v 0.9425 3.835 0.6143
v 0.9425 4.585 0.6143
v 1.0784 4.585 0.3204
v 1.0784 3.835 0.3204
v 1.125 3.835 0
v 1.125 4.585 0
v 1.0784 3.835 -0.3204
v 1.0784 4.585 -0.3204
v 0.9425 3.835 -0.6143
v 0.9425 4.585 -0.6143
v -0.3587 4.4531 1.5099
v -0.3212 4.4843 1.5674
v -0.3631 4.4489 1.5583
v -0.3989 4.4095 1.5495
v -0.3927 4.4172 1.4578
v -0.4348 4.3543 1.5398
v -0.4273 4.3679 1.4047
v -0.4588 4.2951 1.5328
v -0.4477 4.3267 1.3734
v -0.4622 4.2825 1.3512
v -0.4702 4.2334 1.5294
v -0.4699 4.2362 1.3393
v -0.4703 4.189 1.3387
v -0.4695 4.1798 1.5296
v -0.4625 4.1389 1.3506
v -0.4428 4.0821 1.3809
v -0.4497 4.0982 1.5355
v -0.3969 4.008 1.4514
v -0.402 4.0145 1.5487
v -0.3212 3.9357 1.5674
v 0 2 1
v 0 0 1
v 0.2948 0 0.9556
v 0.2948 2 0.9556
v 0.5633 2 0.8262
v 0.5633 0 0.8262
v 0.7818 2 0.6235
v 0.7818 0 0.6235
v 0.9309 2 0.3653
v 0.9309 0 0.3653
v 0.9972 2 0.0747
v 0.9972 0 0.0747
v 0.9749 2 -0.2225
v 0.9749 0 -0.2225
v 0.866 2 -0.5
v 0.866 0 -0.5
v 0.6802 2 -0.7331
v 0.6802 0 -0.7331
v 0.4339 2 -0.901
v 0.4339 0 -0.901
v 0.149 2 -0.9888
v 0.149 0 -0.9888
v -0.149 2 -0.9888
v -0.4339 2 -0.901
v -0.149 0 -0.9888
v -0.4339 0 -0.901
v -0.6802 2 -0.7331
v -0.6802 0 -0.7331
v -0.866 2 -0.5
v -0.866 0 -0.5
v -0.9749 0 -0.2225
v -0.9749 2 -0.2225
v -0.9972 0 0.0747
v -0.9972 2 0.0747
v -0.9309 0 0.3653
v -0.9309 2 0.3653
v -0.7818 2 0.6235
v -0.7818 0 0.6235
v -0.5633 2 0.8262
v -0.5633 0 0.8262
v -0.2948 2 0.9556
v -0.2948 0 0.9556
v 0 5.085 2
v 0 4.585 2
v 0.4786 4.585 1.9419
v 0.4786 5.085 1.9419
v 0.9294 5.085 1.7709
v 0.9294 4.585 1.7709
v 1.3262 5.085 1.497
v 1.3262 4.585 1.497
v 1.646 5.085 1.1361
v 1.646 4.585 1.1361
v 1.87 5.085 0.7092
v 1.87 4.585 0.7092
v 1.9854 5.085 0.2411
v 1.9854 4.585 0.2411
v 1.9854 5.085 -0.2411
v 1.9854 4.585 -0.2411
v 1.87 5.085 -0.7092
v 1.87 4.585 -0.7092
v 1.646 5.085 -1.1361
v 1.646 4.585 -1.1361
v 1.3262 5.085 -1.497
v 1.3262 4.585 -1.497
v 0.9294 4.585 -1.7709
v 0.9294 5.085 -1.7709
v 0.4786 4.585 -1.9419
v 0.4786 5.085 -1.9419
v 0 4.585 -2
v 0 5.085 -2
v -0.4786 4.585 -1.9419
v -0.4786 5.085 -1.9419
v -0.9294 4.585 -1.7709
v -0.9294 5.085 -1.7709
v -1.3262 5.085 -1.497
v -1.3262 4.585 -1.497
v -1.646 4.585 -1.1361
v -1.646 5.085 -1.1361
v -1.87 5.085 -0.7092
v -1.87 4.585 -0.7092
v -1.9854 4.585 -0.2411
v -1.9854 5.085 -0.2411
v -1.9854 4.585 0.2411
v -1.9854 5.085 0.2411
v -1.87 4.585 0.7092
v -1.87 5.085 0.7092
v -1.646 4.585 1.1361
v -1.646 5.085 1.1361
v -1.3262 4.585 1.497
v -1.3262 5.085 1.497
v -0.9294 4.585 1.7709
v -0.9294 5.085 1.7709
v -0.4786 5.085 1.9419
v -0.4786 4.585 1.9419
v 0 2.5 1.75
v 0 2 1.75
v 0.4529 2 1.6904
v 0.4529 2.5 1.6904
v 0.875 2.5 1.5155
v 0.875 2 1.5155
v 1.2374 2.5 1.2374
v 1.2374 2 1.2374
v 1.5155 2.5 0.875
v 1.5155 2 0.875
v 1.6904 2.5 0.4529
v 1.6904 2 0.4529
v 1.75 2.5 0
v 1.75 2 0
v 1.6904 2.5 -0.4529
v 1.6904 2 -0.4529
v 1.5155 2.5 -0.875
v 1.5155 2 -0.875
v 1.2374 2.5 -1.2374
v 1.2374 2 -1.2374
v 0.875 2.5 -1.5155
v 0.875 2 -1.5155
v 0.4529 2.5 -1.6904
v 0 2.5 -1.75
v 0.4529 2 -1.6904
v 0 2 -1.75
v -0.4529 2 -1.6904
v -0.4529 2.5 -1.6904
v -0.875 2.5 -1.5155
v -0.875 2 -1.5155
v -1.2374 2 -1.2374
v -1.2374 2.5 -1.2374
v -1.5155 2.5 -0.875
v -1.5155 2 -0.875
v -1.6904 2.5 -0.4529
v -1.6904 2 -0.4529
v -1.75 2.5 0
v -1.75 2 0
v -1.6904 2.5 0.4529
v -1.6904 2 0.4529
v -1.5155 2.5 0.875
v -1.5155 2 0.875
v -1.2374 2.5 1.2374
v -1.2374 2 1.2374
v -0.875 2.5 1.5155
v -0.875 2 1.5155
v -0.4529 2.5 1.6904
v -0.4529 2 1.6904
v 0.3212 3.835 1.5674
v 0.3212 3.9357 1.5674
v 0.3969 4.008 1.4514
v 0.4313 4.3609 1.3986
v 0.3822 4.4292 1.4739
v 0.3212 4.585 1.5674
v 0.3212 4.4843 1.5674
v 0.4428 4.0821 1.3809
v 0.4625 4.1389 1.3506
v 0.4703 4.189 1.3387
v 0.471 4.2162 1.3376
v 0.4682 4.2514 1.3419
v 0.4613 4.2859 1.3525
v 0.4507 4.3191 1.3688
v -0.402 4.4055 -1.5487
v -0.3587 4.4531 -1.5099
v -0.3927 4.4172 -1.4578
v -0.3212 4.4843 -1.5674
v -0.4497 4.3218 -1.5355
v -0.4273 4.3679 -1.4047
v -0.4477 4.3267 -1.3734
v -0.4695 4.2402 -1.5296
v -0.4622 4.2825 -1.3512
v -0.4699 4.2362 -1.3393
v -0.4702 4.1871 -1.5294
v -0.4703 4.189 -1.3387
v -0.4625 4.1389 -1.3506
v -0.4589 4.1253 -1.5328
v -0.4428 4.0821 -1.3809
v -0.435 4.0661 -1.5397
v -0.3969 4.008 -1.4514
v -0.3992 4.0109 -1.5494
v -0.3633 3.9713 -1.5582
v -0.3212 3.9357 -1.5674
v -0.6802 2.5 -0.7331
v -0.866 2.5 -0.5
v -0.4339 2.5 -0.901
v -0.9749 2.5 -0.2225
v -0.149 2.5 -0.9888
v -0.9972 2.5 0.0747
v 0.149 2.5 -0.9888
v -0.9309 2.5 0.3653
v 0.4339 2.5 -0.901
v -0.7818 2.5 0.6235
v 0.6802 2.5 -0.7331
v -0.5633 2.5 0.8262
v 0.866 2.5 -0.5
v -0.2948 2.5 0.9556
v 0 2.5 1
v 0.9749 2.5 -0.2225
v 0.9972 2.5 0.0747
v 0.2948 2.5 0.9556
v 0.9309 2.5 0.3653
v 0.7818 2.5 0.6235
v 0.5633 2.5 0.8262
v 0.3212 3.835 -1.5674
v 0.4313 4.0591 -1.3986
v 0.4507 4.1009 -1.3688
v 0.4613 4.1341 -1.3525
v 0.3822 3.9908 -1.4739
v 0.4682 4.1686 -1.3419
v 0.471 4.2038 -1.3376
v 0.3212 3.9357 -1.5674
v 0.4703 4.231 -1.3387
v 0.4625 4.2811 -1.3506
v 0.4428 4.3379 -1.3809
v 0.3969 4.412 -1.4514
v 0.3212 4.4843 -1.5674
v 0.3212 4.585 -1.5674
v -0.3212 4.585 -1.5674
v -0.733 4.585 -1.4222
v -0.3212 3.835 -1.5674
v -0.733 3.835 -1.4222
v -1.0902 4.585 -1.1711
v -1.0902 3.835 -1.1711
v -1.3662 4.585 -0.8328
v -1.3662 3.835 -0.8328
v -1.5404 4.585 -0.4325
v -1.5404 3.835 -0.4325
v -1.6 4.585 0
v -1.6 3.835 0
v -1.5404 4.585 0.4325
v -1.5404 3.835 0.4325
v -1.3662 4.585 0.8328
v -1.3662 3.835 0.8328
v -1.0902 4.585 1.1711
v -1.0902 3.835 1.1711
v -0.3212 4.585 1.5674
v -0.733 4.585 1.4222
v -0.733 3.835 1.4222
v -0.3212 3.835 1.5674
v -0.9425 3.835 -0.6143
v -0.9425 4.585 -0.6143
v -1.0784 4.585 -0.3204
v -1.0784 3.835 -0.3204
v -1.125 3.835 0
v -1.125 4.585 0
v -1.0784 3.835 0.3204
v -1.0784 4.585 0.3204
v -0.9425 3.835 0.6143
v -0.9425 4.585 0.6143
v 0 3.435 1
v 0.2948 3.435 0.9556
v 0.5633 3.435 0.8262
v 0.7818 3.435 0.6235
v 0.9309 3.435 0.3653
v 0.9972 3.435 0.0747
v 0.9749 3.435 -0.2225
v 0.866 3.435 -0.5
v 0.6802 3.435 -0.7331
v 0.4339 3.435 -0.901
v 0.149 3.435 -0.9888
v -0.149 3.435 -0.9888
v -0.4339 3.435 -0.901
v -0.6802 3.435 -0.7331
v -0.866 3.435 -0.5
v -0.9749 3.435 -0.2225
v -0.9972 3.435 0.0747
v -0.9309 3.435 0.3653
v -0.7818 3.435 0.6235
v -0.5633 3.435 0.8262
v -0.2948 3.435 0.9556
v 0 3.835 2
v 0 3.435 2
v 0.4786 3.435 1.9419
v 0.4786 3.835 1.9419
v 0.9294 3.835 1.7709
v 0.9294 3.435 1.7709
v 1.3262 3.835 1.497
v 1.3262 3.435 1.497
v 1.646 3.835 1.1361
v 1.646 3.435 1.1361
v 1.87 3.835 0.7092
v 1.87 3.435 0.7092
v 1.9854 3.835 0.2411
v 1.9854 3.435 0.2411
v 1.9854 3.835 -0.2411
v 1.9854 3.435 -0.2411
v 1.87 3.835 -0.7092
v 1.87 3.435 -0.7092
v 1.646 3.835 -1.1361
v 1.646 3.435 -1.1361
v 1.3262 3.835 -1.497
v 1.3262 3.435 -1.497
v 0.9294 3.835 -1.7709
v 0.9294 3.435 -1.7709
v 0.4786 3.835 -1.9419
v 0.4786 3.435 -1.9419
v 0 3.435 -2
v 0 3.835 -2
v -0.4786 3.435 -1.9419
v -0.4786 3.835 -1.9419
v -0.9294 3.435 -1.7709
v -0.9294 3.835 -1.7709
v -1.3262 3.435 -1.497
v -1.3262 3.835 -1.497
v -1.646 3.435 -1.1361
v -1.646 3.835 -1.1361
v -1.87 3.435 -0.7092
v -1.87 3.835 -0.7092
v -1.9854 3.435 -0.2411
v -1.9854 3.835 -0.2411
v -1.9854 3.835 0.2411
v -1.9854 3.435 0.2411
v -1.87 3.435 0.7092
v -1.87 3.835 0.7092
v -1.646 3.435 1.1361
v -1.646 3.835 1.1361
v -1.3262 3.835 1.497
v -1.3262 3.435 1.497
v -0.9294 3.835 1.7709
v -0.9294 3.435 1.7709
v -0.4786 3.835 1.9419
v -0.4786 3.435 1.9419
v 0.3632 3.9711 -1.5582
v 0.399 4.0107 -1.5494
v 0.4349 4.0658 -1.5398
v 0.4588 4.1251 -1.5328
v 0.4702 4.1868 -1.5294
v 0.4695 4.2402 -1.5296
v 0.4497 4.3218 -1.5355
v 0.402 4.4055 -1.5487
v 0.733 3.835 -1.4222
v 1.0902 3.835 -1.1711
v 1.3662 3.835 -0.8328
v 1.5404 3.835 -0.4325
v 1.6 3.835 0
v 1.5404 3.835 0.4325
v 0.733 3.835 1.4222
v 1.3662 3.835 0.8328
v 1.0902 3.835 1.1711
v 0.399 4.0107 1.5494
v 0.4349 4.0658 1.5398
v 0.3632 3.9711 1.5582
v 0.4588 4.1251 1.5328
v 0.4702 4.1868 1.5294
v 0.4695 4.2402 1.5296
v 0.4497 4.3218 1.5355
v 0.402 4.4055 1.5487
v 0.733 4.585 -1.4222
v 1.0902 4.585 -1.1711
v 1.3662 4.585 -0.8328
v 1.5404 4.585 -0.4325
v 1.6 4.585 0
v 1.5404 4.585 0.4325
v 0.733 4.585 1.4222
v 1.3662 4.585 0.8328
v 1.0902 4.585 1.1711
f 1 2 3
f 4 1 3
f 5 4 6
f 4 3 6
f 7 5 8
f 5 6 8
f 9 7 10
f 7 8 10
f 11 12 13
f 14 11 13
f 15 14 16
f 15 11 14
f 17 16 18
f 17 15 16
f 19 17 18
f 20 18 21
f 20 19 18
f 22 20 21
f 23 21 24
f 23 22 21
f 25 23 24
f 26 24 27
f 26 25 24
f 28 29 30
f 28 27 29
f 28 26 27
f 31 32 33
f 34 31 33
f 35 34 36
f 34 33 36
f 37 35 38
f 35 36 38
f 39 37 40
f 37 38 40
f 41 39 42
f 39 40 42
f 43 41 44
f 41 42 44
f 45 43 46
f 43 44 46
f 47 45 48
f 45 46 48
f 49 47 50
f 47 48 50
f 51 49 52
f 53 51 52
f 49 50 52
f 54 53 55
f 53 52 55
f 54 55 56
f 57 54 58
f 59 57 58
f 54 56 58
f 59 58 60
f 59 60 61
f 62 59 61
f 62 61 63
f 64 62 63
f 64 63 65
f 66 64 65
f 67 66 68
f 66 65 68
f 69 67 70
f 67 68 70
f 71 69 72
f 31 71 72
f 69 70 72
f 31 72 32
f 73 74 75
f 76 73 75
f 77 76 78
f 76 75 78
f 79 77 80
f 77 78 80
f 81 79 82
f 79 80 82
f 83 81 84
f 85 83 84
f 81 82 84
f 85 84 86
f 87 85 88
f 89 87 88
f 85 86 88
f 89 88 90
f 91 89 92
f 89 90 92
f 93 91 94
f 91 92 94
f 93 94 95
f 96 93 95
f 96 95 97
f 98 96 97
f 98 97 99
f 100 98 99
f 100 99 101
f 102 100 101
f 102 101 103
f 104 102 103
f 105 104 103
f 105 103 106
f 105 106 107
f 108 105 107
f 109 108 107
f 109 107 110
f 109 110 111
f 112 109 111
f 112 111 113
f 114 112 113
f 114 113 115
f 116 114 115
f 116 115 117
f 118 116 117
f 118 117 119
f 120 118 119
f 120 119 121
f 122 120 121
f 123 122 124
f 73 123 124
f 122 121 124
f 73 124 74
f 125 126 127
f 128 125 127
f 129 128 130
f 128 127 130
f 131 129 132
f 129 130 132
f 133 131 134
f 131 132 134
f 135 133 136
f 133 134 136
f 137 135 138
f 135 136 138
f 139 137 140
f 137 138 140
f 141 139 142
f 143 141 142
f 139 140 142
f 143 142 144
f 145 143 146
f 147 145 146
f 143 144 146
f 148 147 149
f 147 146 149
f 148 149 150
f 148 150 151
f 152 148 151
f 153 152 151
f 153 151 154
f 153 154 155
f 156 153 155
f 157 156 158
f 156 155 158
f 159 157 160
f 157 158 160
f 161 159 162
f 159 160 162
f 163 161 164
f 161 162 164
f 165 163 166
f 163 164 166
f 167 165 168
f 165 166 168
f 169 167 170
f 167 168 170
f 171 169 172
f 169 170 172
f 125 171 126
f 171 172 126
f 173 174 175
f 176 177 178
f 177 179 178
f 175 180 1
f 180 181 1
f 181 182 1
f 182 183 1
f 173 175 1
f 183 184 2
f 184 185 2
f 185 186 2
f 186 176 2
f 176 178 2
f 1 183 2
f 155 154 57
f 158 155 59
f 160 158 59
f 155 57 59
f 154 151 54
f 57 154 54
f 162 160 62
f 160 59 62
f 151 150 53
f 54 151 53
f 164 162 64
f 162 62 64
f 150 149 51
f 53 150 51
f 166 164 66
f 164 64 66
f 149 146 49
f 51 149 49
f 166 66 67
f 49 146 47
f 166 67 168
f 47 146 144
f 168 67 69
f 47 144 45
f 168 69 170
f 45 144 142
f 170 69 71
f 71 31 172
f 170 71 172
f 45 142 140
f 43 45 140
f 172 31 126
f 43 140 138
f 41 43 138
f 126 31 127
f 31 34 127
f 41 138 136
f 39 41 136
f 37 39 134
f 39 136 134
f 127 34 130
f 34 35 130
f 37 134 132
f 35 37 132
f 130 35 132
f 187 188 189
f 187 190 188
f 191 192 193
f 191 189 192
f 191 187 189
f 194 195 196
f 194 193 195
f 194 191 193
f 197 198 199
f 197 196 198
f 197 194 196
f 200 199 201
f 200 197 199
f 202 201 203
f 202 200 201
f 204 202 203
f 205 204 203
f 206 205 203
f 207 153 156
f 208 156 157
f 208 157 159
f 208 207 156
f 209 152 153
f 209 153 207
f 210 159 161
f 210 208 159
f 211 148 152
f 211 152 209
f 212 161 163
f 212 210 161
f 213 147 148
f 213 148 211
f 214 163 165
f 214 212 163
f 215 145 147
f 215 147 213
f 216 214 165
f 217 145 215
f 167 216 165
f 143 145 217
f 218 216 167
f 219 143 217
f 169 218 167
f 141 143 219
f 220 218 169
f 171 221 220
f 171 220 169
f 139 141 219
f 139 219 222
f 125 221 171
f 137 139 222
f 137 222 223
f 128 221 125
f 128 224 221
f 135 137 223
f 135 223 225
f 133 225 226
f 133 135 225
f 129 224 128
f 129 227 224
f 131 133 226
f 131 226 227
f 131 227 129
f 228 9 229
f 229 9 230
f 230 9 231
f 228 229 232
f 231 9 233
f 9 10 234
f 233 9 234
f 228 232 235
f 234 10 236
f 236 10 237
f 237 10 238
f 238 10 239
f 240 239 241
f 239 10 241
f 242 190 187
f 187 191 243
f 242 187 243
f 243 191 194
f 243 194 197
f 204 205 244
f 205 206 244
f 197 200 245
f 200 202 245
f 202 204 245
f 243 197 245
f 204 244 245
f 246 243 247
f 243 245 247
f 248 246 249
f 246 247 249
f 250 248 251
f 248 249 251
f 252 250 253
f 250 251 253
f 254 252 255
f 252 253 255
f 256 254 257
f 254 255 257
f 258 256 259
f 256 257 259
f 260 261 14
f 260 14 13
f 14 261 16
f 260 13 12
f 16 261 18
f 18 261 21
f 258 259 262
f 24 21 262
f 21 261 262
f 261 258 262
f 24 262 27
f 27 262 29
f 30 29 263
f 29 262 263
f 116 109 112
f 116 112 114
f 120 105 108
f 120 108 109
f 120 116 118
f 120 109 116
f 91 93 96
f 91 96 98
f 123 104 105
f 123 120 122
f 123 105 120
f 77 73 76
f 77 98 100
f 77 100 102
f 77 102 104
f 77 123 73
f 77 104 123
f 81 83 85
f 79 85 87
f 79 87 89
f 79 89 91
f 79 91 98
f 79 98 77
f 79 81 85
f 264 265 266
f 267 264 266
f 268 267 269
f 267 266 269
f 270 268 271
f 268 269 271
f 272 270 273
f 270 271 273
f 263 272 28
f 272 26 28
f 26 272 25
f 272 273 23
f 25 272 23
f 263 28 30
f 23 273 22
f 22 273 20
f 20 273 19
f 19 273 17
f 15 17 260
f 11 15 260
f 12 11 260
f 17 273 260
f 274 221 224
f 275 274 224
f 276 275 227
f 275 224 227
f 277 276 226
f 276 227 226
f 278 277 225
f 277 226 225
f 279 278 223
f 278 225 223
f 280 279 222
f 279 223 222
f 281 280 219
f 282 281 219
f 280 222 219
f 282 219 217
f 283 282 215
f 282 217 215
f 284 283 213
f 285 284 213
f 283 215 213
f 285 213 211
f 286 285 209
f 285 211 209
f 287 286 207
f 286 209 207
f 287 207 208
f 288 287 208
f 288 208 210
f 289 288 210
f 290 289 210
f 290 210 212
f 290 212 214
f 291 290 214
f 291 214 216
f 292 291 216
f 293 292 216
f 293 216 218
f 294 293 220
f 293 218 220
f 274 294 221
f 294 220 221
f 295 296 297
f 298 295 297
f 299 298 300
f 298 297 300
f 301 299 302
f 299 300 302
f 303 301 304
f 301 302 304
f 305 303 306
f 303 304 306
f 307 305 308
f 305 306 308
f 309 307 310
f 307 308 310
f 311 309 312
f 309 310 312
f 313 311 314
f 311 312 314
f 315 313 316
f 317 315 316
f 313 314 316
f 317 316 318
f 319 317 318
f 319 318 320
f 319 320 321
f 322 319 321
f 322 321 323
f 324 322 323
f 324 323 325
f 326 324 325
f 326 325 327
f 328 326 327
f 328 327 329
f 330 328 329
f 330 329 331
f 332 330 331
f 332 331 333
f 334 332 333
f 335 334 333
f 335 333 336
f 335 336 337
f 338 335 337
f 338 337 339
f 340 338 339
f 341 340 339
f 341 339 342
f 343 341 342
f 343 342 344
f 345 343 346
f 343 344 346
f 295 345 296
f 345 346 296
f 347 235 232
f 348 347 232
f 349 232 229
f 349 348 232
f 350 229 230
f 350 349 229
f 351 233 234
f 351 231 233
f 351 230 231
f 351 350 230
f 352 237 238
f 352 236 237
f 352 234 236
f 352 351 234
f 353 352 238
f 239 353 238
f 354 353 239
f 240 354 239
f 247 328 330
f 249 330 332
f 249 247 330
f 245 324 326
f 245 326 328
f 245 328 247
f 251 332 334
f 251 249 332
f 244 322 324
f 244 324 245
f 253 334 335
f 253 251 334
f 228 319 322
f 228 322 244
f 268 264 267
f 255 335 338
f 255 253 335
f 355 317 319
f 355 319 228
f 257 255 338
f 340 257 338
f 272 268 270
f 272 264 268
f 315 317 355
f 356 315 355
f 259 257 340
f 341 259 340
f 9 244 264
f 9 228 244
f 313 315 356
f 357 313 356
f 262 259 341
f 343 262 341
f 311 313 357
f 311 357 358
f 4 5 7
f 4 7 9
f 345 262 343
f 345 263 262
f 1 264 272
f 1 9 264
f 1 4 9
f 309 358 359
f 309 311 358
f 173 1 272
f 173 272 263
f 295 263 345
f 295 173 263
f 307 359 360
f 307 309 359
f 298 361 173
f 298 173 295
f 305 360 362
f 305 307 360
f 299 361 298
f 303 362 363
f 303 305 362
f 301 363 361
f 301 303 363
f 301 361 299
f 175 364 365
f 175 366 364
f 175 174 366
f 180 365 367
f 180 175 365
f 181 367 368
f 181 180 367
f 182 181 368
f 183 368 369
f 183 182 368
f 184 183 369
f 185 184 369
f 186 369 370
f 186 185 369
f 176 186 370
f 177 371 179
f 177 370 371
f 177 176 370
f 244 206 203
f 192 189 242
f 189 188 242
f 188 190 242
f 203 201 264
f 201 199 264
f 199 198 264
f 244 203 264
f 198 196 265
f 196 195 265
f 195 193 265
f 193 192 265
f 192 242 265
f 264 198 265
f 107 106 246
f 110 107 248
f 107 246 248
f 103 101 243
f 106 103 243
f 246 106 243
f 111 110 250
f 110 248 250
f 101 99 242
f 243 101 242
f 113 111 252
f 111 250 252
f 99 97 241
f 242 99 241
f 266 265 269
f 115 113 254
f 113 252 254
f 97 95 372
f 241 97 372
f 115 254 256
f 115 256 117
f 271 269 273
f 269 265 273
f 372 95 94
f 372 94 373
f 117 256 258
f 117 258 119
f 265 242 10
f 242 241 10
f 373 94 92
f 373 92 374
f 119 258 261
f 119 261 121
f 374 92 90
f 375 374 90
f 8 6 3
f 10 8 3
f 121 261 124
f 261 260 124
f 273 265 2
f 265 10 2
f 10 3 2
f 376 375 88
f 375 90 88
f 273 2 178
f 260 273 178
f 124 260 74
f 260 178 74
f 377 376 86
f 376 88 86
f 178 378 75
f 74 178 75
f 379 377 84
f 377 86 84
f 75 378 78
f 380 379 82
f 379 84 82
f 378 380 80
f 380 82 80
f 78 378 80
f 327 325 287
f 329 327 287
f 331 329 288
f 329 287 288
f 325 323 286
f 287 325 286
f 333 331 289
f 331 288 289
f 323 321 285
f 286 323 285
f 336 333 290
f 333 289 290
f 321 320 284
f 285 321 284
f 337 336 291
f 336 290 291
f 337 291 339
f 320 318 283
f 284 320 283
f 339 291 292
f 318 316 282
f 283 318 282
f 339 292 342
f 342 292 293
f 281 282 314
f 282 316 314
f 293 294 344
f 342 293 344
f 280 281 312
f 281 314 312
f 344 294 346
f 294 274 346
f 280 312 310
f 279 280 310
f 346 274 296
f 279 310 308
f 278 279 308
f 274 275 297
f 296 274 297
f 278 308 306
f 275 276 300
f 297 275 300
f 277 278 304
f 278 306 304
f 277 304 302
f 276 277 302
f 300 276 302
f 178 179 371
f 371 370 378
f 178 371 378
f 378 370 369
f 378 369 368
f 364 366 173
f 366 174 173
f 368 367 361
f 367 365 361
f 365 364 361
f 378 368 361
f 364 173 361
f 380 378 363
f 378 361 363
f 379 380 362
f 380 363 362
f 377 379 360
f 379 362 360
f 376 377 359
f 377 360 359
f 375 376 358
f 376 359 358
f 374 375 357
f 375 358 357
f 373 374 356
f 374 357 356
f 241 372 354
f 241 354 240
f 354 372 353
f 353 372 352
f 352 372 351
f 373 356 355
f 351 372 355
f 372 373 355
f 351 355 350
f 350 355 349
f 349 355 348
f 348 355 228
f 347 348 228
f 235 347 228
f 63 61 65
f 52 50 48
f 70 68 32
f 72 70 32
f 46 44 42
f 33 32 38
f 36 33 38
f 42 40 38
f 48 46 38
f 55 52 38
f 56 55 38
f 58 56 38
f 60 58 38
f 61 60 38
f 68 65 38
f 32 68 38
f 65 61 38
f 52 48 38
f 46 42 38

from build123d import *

# Parameters (mm, degrees)
CROQUIS1_R                 = 1
SALIENTE_EXTRUIR1_DEPTH    = 2
CROQUIS2_R                 = 1.75
SALIENTE_EXTRUIR2_DEPTH    = 0.5
CROQUIS3_R                 = 1
SALIENTE_EXTRUIR3_DEPTH    = 0.935
CROQUIS4_R                 = 2
SALIENTE_EXTRUIR4_DEPTH    = 0.4
CROQUIS6_R                 = 1.6
SALIENTE_EXTRUIR5_DEPTH    = 0.75
CROQUIS7_R                 = 2
SALIENTE_EXTRUIR6_DEPTH    = 0.5
CORTAR_EXTRUIR2_DEPTH      = 10
CORTAR_EXTRUIR2_DEPTH_BACK = 10
CROQUIS11_RX               = 0.471075949
CROQUIS11_RY               = 0.375
CORTAR_EXTRUIR3_START      = 0.75
CROQUIS12_R                = 1
CORTAR_EXTRUIR3_DEPTH      = 0.75
CORTAR_EXTRUIR4_DEPTH      = 0.75


with BuildPart() as part:
    # Croquis1 → Saliente-Extruir1 (new body)
    with BuildSketch(Plane(origin=(0, 0, 0), x_dir=(1, 0, 0), z_dir=(0, 1, 0))):
        Circle(CROQUIS1_R)
    extrude(amount=SALIENTE_EXTRUIR1_DEPTH)

    # Croquis2 → Saliente-Extruir2 (add)
    with BuildSketch(Plane(origin=(0, 2, 0), x_dir=(1, 0, 0), z_dir=(0, 1, 0))):
        Circle(CROQUIS2_R)
    extrude(amount=SALIENTE_EXTRUIR2_DEPTH)

    # Croquis3 → Saliente-Extruir3 (add)
    with BuildSketch(Plane(origin=(0, 2.5, 0), x_dir=(1, 0, 0), z_dir=(0, 1, 0))):
        Circle(CROQUIS3_R)
    extrude(amount=SALIENTE_EXTRUIR3_DEPTH)

    # Croquis4 → Saliente-Extruir4 (add)
    with BuildSketch(Plane(origin=(0, 3.435, 0), x_dir=(1, 0, 0), z_dir=(0, 1, 0))):
        Circle(CROQUIS4_R)
    extrude(amount=SALIENTE_EXTRUIR4_DEPTH)

    # Croquis6 → Saliente-Extruir5 (add)
    with BuildSketch(Plane(origin=(0, 3.835, 0), x_dir=(1, 0, 0), z_dir=(0, 1, 0))):
        Circle(CROQUIS6_R)
    extrude(amount=SALIENTE_EXTRUIR5_DEPTH)

    # Croquis7 → Saliente-Extruir6 (add)
    with BuildSketch(Plane(origin=(0, 4.585, 0), x_dir=(1, 0, 0), z_dir=(0, 1, 0))):
        Circle(CROQUIS7_R)
    extrude(amount=SALIENTE_EXTRUIR6_DEPTH)

    # Croquis11 → Cortar-Extruir2 (cut, two sides: drawn at the far end of the back side and taken through both)
    with BuildSketch(Plane.XY.offset(-CORTAR_EXTRUIR2_DEPTH_BACK)):
        with Locations(Location((0, 4.21), (0, 0, 180))):
            Ellipse(CROQUIS11_RX, CROQUIS11_RY)
    extrude(amount=CORTAR_EXTRUIR2_DEPTH + CORTAR_EXTRUIR2_DEPTH_BACK, mode=Mode.SUBTRACT)

    # Croquis12 → Cortar-Extruir3 (cut)
    with BuildSketch(Plane.XZ.offset(-4.585).offset(CORTAR_EXTRUIR3_START)):
        Circle(CROQUIS12_R)
    extrude(amount=-CORTAR_EXTRUIR3_DEPTH, mode=Mode.SUBTRACT)

    # Croquis13 → Cortar-Extruir4 (cut)
    with BuildSketch(Plane.XZ.offset(-4.585)):
        with BuildLine():
            Line((-0.3, -1.6), (-0.942474676, -0.614301623))
            ThreePointArc((-0.942474676, -0.614301623), (-1.125, 0), (-0.942474676, 0.614301623))
            Line((-0.942474676, 0.614301623), (-0.3, 1.6))
            Line((-0.3, 1.6), (0, 1.6))
            Line((0, 1.6), (0.3, 1.6))
            Line((0.3, 1.6), (0.942474676, 0.614301623))
            ThreePointArc((0.942474676, 0.614301623), (1.125, 0), (0.942474676, -0.614301623))
            Line((0.942474676, -0.614301623), (0.3, -1.6))
            Line((0.3, -1.6), (0, -1.6))
            Line((0, -1.6), (-0.3, -1.6))
        make_face()
    extrude(amount=CORTAR_EXTRUIR4_DEPTH, mode=Mode.SUBTRACT)


solid = part.part
